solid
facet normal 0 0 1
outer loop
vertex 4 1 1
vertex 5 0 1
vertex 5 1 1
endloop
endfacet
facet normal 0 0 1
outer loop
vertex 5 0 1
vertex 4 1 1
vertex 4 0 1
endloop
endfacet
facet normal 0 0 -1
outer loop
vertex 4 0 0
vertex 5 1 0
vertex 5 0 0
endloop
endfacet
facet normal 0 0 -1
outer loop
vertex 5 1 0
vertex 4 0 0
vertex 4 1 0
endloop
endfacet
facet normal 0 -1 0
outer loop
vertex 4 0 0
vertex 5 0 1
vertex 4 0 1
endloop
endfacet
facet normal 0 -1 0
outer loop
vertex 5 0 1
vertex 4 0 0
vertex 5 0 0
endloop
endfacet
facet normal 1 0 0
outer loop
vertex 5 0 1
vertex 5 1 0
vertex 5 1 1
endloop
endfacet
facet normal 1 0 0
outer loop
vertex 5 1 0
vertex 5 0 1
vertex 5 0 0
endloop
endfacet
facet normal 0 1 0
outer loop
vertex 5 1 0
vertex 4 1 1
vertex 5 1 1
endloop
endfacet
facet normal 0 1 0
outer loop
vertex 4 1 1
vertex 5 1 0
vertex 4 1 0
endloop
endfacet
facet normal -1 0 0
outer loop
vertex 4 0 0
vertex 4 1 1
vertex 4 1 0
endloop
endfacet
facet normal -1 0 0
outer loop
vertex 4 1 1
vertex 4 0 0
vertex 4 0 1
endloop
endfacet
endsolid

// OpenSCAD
// file: builtins.scad
// V-004 builtins: thin wrappers that capture OpenSCAD builtins behind a `use` boundary, so an
// overriding module can still reach the original (BOSL2's builtins.scad pattern). `use`d, never
// included, so inside this file `translate` is always the builtin.
module _translate(v) translate(v) children();
// file: transforms.scad
// V-004 transforms: OVERRIDES the builtin `translate`, reaching the original via the use'd wrapper
// (BOSL2's transforms.scad pattern). When flattened, the bundle must keep the wrapper's builtin
// `translate` distinct from this override, or the two recurse forever.
use <builtins.scad>

module translate(v) { _translate(v) children(); }
// main file
// V-004 — two real-world BOSL2 hazards in one bundle, both verified byte-identical against the
// official binary:
//   1. A use'd builtin wrapper (builtins.scad's `_translate`, where `translate` = the builtin) is
//      overridden by an include'd module (transforms.scad's `module translate`). Naive flattening
//      drops both into one scope, so the wrapper's bare `translate` binds to the override → infinite
//      recursion. The inliner frees the builtin name by renaming the include-origin override.
//   2. A self-recursive anonymous function literal in a let-binding. A function literal is a closure
//      resolved at call time, so its own name is in scope inside its body; the analyzer must not warn.
include <transforms.scad>

// f(4) = 1 + 1 + 1 + 1 + f(0) = 4 — exercises the recursive literal; count drives the geometry below.
count = let(f = function(n) n <= 0 ? 0 : 1 + f(n - 1)) f(4);

translate([count, 0, 0]) cube(1);
